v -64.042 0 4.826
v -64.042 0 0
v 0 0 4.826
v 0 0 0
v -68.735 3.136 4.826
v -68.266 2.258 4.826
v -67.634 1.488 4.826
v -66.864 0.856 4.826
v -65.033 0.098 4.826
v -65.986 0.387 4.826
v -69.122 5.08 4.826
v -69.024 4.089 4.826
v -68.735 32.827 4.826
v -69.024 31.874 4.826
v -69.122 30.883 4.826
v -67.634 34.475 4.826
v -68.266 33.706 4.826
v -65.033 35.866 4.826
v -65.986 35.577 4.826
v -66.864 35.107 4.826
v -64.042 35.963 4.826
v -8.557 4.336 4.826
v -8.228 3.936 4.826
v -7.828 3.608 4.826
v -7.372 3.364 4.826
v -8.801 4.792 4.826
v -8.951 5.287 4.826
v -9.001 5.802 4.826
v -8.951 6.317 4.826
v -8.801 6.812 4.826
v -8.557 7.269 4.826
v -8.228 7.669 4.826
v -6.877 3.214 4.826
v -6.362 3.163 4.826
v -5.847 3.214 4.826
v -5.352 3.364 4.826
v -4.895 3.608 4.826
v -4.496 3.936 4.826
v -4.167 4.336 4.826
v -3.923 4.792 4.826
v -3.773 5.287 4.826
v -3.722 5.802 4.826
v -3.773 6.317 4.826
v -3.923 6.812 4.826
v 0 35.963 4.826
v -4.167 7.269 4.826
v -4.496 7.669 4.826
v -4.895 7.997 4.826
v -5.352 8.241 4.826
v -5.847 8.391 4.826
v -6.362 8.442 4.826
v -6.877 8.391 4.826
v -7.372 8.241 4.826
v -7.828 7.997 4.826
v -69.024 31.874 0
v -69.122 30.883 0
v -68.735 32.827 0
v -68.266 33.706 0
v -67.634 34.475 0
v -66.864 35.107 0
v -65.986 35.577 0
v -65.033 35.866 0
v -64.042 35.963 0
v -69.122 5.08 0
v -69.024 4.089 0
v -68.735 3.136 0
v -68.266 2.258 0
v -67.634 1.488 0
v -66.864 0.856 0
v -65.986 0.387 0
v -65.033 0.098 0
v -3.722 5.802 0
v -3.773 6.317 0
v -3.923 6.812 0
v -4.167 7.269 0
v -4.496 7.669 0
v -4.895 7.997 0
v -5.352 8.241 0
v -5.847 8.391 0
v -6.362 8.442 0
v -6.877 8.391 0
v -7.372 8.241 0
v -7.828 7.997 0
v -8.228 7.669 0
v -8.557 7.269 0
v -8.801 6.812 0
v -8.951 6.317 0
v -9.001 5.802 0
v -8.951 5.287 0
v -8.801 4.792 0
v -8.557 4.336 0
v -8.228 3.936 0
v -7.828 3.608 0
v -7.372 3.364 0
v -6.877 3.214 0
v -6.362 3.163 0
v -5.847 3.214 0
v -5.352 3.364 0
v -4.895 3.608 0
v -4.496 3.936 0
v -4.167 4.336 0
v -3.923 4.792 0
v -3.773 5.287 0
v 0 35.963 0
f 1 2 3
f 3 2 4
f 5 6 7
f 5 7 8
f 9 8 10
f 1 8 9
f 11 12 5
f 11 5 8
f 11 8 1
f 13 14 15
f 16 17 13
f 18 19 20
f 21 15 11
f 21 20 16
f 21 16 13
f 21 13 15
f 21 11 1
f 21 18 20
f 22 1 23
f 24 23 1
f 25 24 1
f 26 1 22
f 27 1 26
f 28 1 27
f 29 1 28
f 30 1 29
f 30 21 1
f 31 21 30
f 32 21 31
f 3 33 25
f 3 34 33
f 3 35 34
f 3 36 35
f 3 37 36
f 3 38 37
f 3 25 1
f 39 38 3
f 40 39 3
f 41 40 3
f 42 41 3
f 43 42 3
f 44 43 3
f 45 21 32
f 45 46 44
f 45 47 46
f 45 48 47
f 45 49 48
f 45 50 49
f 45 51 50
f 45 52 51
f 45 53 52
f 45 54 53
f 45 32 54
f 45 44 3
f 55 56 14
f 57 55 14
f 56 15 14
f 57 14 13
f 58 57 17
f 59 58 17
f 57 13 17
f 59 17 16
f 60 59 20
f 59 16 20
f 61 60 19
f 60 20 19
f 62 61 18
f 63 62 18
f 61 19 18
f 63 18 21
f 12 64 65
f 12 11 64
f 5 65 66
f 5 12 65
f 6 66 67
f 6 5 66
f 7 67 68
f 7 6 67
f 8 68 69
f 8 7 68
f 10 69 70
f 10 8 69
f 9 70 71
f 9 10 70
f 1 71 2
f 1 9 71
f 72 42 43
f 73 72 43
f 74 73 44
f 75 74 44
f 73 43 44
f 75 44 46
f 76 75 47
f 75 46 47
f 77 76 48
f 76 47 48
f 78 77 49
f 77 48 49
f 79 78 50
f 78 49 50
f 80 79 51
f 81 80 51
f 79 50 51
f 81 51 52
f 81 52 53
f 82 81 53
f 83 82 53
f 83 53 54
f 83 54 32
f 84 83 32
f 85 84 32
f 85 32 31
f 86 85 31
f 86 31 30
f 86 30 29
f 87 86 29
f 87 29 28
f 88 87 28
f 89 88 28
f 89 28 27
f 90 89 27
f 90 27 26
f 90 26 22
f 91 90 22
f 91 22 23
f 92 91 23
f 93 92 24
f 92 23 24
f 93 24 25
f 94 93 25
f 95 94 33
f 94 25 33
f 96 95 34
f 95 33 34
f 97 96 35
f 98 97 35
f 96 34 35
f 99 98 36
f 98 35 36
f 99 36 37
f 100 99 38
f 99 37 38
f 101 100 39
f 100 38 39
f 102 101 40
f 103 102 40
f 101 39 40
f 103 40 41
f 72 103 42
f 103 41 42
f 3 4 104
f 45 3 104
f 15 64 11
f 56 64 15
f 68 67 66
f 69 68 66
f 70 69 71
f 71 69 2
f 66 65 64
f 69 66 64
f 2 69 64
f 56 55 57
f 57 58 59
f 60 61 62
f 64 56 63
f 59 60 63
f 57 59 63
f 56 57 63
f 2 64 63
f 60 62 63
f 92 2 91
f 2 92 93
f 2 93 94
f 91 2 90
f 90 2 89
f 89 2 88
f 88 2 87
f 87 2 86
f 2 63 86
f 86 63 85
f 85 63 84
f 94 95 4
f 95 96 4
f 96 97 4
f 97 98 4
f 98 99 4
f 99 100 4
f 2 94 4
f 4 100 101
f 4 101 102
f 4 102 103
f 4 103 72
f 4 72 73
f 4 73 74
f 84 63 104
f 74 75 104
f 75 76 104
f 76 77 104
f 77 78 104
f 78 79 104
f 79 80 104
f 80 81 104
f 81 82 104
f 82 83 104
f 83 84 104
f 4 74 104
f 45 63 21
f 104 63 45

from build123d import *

# Parameters (mm, degrees)
F0_W     = 69.122039
F0_H     = 35.963256
F1_DEPTH = 4.826
F2_R     = 5.08
F3_R     = 5.08
F4_R     = 2.639502
F5_DEPTH = 25.4


with BuildPart() as f1:
    # F0 (on Top) → F1 (new body)
    with BuildSketch(Plane.XY):
        with Locations((-34.56102, 17.981628)):
            Rectangle(F0_W, F0_H)
    extrude(amount=F1_DEPTH)

    # F2
    f2_edges = [f1.edges().sort_by_distance(p)[0] for p in [
        (-69.122039, 0, 2.413),
    ]]
    fillet(f2_edges, radius=F2_R)

    # F3
    f3_edges = [f1.edges().sort_by_distance(p)[0] for p in [
        (-69.122039, 35.963256, 2.413),
    ]]
    fillet(f3_edges, radius=F3_R)

    # F4 (on face) → F5 (cut)
    with BuildSketch(Plane.XY.offset(4.826)):
        with Locations((-6.361922, 5.802391)):
            Circle(F4_R)
    extrude(amount=-F5_DEPTH, mode=Mode.SUBTRACT)


solid = f1.part
